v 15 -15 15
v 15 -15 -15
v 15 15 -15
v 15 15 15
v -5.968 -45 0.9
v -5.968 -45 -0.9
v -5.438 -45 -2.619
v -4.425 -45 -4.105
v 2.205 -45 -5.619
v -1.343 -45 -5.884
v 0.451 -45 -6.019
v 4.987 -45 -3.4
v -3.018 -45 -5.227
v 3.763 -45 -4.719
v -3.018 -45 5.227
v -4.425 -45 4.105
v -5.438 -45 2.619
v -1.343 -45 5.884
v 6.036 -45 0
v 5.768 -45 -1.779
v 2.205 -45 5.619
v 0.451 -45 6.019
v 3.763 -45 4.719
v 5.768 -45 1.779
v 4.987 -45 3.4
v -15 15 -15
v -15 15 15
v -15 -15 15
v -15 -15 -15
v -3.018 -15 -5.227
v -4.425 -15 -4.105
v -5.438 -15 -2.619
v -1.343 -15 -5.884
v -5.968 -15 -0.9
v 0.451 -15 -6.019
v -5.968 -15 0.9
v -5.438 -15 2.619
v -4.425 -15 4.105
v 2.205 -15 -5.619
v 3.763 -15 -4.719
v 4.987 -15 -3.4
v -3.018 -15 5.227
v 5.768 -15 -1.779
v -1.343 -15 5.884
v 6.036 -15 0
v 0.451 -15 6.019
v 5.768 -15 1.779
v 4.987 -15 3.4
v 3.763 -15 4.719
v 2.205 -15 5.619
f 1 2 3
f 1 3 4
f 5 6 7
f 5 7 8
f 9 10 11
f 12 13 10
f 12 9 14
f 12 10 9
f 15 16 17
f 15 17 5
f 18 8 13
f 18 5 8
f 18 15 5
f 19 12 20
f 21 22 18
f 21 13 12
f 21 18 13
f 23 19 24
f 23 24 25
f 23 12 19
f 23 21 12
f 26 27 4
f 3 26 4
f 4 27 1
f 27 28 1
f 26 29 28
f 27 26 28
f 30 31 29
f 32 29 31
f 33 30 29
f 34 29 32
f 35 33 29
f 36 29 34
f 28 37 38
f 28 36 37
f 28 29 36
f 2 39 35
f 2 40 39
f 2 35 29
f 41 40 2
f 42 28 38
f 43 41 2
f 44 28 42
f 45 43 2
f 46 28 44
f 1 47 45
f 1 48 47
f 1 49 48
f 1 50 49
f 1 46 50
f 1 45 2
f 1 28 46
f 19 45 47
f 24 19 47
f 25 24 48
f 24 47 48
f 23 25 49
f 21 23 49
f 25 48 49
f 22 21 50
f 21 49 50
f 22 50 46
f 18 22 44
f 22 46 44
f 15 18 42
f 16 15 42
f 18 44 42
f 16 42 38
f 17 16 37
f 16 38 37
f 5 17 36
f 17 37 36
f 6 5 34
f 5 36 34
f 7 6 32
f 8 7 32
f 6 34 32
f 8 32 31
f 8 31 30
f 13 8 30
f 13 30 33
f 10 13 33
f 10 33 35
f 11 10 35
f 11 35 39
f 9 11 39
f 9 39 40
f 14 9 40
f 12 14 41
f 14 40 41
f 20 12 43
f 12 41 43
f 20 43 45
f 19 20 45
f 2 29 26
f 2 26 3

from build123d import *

# Parameters (mm, degrees)
F0_W     = 30
F0_H     = 30
F1_DEPTH = 15
F2_R     = 6.035824
F3_DEPTH = 30


with BuildPart() as f1:
    # F0 (on Front) → F1 (new body, symmetric)
    with BuildSketch(Plane.XZ):
        Rectangle(F0_W, F0_H)
    extrude(amount=F1_DEPTH, both=True)

    # F2 (on face) → F3 (join)
    with BuildSketch(Plane.XZ.offset(15)):
        Circle(F2_R)
    extrude(amount=F3_DEPTH)


solid = f1.part
